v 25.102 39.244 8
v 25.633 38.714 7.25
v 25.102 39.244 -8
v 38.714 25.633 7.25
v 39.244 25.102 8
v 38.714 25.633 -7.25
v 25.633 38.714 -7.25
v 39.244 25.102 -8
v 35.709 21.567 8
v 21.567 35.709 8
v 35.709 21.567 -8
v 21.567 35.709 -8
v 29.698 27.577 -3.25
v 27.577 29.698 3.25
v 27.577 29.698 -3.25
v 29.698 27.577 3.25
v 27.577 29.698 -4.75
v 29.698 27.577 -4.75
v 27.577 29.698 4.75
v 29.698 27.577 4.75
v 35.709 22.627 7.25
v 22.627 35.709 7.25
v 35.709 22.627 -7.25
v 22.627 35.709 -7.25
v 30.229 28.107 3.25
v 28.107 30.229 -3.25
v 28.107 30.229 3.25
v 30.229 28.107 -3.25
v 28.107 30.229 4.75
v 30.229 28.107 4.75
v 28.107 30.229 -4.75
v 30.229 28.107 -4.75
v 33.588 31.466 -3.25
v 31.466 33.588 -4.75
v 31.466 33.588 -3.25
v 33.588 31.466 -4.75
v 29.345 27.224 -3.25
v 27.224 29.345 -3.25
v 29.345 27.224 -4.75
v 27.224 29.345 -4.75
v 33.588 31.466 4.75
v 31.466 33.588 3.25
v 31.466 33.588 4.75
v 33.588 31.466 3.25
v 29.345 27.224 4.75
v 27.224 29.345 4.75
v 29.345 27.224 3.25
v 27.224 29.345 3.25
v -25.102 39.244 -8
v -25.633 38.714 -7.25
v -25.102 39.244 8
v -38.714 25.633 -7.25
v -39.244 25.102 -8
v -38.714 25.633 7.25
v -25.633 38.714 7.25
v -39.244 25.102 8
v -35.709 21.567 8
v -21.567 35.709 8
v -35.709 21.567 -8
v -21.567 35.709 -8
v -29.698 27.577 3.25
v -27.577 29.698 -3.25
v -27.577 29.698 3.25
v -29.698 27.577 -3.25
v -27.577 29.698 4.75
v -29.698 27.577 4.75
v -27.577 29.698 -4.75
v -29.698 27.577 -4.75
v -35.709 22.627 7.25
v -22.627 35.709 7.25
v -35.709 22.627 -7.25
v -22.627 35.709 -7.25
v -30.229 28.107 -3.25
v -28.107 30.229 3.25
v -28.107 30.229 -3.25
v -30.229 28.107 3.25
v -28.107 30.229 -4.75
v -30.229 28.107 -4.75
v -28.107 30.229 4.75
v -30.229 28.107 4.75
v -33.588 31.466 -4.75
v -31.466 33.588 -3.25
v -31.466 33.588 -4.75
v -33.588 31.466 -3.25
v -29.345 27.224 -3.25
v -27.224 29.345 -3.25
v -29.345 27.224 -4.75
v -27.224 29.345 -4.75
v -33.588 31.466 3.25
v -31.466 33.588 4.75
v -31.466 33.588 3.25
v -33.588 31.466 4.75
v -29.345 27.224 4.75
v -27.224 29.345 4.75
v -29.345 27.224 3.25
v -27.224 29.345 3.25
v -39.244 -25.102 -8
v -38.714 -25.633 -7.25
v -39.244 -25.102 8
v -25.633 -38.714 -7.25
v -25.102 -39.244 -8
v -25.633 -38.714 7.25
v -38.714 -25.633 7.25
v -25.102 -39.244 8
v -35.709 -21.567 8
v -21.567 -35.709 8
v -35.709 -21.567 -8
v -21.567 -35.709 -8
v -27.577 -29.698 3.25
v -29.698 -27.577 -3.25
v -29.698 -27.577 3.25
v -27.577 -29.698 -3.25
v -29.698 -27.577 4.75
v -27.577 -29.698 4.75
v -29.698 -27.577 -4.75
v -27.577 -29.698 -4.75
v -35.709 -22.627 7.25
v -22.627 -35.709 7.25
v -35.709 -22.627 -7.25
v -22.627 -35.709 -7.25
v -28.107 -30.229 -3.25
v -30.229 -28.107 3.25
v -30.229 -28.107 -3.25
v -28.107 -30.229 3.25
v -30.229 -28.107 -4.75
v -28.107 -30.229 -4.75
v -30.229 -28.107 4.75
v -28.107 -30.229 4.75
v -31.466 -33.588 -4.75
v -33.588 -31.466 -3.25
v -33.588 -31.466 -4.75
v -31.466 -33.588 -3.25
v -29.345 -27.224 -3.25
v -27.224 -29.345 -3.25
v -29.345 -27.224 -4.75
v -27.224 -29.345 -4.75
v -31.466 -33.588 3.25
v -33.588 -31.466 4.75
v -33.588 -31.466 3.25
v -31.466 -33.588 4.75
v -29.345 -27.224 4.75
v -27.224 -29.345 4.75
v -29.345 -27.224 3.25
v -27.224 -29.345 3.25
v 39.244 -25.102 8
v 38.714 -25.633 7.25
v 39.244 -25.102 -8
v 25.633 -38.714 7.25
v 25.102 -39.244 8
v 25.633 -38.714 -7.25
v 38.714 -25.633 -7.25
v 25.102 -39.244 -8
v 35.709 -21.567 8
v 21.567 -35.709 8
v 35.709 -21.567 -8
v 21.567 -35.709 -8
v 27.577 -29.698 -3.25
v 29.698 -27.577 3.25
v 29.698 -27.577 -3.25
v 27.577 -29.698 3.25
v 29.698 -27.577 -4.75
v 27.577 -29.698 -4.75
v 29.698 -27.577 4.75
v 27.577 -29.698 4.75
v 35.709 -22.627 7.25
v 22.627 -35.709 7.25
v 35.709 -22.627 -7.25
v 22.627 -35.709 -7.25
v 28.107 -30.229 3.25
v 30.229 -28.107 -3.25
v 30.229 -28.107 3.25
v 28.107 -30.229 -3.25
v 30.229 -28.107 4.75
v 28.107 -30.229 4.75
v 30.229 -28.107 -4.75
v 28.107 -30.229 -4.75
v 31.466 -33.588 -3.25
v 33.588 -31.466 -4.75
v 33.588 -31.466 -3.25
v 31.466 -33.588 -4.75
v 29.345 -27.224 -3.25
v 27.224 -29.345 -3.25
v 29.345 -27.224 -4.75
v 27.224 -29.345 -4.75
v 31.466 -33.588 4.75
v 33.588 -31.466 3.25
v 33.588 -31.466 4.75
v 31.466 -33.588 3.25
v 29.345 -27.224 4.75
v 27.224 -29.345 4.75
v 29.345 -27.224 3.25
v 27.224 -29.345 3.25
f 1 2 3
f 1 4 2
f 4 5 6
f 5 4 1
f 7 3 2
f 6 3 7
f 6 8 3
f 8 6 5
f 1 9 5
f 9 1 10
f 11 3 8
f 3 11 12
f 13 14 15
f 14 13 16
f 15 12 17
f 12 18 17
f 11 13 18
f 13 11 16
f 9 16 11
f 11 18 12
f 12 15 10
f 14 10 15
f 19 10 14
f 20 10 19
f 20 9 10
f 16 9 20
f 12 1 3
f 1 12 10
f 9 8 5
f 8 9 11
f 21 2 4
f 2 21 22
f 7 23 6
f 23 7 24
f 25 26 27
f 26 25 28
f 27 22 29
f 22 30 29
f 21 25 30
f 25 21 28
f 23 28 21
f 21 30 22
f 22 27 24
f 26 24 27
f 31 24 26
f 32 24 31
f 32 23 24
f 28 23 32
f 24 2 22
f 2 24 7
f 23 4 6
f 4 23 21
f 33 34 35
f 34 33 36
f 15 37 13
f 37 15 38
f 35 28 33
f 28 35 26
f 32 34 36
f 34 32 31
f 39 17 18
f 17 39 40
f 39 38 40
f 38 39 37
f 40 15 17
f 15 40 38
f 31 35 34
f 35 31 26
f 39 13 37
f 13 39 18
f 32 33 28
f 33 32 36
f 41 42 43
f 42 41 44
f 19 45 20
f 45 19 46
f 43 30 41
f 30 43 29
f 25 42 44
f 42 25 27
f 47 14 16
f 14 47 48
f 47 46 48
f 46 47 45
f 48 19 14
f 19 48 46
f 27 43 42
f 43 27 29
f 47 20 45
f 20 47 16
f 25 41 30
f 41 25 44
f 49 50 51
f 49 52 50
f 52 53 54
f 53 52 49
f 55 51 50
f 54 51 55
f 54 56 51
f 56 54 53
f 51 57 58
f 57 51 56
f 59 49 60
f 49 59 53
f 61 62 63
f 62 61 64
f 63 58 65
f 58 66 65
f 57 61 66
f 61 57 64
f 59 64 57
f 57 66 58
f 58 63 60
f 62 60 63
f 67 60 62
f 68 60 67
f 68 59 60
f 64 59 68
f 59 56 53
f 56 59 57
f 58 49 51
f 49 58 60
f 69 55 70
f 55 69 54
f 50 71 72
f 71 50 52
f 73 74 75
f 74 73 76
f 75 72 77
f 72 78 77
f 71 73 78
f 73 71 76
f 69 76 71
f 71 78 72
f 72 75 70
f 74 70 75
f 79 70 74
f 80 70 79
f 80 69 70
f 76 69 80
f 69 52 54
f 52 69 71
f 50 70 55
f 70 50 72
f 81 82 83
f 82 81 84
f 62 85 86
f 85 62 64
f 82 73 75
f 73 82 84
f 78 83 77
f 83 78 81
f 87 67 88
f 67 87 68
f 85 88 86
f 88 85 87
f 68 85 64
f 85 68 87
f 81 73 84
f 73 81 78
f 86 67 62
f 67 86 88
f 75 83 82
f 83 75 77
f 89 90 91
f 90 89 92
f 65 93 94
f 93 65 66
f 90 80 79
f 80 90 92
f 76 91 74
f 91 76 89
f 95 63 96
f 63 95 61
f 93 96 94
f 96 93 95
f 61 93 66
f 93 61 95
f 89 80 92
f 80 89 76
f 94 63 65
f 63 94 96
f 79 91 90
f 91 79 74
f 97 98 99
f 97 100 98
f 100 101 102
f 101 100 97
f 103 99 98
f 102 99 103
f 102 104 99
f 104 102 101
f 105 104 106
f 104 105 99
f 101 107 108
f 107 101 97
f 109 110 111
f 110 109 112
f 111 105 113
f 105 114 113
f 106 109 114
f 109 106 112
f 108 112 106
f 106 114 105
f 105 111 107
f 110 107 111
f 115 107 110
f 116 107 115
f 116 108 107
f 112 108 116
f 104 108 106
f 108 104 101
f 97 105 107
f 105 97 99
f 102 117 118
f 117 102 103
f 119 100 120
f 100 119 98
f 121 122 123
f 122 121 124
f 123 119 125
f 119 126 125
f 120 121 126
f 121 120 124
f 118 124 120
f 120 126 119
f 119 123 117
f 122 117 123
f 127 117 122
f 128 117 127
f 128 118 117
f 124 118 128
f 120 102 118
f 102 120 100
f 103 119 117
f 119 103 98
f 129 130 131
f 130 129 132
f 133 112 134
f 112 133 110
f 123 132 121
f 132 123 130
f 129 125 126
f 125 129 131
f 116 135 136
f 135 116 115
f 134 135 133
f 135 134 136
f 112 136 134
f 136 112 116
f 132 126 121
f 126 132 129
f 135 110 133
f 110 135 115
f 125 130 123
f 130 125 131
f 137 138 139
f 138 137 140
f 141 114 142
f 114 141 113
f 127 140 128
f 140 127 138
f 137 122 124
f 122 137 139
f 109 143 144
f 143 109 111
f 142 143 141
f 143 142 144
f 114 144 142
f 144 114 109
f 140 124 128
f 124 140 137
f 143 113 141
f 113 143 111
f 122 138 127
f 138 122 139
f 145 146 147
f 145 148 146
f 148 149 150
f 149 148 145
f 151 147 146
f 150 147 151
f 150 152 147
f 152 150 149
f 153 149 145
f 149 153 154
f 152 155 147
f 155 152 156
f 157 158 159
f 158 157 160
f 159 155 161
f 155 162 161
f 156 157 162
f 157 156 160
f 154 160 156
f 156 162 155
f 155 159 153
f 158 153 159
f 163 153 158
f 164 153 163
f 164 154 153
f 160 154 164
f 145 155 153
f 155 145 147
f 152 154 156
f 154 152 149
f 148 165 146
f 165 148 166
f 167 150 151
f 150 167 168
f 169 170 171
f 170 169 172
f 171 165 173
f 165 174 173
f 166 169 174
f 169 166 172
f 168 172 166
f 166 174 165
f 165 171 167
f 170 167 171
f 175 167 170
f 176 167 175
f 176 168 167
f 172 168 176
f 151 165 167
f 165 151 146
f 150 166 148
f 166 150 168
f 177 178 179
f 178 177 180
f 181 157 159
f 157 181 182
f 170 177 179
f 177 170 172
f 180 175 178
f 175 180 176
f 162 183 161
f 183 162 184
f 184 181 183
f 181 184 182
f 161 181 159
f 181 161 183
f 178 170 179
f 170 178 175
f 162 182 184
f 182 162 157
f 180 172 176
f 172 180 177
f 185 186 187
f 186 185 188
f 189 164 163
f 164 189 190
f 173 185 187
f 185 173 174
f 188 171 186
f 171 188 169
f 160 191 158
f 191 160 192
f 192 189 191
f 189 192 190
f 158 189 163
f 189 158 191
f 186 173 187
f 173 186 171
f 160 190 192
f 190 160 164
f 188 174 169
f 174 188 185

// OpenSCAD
// file: 55_stage1_print_parameters.scad
/* BUDDY FILE 55 - STAGE 1 PRINT / INTERFACE PARAMETERS
All dimensions mm. Values marked PROCESS are starting points for calibration coupons. */
B1_OD=115; B1_CAVITY_D=111; B1_AIRWAY_D=70; B1_DUCT_OD=74;
B1_SHELL_R=B1_OD/2; B1_CAVITY_R=B1_CAVITY_D/2;
B1_WALL=2.0; B1_MIN_RIB=2.2; B1_MIN_WEB=1.2;
B1_FDM_SLIDE=0.30;       // PROCESS: per side, calibrate
B1_FDM_PRESS=0.10;       // PROCESS: per side, calibrate
B1_INSERT_OD=3.2;        // PLACEHOLDER for M2-class heat-set insert; replace from selected insert drawing
B1_M2_CLEAR=2.4;         // PROCESS starting clearance
B1_M2_HEAD=4.3;          // PLACEHOLDER head pocket
B1_M2_HEAD_H=1.8;
B1_POLAR_OPENING_D=74.8;
B1_CAMERA_DUCT_GAP=0.8; B1_CAMERA_SHELL_MARGIN=1.0;
B1_ROTOR_NOMINAL_R=34.6; B1_ROTOR_STATIC_RADIAL_GAP=B1_AIRWAY_D/2-B1_ROTOR_NOMINAL_R;
assert(B1_OD==115); assert(B1_CAVITY_D==111); assert(B1_AIRWAY_D==70);
assert(B1_POLAR_OPENING_D>B1_DUCT_OD);
assert(B1_ROTOR_STATIC_RADIAL_GAP>0);
echo("FILE55 Stage1 architecture OD/cavity/airway =",B1_OD,B1_CAVITY_D,B1_AIRWAY_D);
echo("PROCESS tolerances require calibration before production prints");
// main file
/* BUDDY FILE84 - MODULAR ELECTRONICS CARRIERS
Four quadrant trays; board dimensions remain hardware inputs. */
include <55_stage1_print_parameters.scad>
$fn=64;
PCB=[18,14,4]; WALL=1.0; CLEAR=.5; R=43;
module pcb_tray(){
 difference(){
  cube([PCB[2]+WALL,PCB[0]+2*WALL,PCB[1]+2*WALL],center=true);
  translate([WALL/2,0,0])cube([PCB[2]+CLEAR,PCB[0]+CLEAR,PCB[1]+CLEAR],center=true);
 }
 // two strain-relief / tie slots
 for(z=[-4,4])translate([0,0,z])cube([PCB[2]+2,3,1.5],center=true);
}
module electronics_four(){for(a=[45,135,225,315])rotate([0,0,a])translate([R,0,0])pcb_tray();}
electronics_four();
assert(R-PCB[2]/2>B1_DUCT_OD/2,"electronics carrier intrudes into duct envelope");
echo("FILE84 modular electronics carriers; replace PCB envelope after selection",PCB);
